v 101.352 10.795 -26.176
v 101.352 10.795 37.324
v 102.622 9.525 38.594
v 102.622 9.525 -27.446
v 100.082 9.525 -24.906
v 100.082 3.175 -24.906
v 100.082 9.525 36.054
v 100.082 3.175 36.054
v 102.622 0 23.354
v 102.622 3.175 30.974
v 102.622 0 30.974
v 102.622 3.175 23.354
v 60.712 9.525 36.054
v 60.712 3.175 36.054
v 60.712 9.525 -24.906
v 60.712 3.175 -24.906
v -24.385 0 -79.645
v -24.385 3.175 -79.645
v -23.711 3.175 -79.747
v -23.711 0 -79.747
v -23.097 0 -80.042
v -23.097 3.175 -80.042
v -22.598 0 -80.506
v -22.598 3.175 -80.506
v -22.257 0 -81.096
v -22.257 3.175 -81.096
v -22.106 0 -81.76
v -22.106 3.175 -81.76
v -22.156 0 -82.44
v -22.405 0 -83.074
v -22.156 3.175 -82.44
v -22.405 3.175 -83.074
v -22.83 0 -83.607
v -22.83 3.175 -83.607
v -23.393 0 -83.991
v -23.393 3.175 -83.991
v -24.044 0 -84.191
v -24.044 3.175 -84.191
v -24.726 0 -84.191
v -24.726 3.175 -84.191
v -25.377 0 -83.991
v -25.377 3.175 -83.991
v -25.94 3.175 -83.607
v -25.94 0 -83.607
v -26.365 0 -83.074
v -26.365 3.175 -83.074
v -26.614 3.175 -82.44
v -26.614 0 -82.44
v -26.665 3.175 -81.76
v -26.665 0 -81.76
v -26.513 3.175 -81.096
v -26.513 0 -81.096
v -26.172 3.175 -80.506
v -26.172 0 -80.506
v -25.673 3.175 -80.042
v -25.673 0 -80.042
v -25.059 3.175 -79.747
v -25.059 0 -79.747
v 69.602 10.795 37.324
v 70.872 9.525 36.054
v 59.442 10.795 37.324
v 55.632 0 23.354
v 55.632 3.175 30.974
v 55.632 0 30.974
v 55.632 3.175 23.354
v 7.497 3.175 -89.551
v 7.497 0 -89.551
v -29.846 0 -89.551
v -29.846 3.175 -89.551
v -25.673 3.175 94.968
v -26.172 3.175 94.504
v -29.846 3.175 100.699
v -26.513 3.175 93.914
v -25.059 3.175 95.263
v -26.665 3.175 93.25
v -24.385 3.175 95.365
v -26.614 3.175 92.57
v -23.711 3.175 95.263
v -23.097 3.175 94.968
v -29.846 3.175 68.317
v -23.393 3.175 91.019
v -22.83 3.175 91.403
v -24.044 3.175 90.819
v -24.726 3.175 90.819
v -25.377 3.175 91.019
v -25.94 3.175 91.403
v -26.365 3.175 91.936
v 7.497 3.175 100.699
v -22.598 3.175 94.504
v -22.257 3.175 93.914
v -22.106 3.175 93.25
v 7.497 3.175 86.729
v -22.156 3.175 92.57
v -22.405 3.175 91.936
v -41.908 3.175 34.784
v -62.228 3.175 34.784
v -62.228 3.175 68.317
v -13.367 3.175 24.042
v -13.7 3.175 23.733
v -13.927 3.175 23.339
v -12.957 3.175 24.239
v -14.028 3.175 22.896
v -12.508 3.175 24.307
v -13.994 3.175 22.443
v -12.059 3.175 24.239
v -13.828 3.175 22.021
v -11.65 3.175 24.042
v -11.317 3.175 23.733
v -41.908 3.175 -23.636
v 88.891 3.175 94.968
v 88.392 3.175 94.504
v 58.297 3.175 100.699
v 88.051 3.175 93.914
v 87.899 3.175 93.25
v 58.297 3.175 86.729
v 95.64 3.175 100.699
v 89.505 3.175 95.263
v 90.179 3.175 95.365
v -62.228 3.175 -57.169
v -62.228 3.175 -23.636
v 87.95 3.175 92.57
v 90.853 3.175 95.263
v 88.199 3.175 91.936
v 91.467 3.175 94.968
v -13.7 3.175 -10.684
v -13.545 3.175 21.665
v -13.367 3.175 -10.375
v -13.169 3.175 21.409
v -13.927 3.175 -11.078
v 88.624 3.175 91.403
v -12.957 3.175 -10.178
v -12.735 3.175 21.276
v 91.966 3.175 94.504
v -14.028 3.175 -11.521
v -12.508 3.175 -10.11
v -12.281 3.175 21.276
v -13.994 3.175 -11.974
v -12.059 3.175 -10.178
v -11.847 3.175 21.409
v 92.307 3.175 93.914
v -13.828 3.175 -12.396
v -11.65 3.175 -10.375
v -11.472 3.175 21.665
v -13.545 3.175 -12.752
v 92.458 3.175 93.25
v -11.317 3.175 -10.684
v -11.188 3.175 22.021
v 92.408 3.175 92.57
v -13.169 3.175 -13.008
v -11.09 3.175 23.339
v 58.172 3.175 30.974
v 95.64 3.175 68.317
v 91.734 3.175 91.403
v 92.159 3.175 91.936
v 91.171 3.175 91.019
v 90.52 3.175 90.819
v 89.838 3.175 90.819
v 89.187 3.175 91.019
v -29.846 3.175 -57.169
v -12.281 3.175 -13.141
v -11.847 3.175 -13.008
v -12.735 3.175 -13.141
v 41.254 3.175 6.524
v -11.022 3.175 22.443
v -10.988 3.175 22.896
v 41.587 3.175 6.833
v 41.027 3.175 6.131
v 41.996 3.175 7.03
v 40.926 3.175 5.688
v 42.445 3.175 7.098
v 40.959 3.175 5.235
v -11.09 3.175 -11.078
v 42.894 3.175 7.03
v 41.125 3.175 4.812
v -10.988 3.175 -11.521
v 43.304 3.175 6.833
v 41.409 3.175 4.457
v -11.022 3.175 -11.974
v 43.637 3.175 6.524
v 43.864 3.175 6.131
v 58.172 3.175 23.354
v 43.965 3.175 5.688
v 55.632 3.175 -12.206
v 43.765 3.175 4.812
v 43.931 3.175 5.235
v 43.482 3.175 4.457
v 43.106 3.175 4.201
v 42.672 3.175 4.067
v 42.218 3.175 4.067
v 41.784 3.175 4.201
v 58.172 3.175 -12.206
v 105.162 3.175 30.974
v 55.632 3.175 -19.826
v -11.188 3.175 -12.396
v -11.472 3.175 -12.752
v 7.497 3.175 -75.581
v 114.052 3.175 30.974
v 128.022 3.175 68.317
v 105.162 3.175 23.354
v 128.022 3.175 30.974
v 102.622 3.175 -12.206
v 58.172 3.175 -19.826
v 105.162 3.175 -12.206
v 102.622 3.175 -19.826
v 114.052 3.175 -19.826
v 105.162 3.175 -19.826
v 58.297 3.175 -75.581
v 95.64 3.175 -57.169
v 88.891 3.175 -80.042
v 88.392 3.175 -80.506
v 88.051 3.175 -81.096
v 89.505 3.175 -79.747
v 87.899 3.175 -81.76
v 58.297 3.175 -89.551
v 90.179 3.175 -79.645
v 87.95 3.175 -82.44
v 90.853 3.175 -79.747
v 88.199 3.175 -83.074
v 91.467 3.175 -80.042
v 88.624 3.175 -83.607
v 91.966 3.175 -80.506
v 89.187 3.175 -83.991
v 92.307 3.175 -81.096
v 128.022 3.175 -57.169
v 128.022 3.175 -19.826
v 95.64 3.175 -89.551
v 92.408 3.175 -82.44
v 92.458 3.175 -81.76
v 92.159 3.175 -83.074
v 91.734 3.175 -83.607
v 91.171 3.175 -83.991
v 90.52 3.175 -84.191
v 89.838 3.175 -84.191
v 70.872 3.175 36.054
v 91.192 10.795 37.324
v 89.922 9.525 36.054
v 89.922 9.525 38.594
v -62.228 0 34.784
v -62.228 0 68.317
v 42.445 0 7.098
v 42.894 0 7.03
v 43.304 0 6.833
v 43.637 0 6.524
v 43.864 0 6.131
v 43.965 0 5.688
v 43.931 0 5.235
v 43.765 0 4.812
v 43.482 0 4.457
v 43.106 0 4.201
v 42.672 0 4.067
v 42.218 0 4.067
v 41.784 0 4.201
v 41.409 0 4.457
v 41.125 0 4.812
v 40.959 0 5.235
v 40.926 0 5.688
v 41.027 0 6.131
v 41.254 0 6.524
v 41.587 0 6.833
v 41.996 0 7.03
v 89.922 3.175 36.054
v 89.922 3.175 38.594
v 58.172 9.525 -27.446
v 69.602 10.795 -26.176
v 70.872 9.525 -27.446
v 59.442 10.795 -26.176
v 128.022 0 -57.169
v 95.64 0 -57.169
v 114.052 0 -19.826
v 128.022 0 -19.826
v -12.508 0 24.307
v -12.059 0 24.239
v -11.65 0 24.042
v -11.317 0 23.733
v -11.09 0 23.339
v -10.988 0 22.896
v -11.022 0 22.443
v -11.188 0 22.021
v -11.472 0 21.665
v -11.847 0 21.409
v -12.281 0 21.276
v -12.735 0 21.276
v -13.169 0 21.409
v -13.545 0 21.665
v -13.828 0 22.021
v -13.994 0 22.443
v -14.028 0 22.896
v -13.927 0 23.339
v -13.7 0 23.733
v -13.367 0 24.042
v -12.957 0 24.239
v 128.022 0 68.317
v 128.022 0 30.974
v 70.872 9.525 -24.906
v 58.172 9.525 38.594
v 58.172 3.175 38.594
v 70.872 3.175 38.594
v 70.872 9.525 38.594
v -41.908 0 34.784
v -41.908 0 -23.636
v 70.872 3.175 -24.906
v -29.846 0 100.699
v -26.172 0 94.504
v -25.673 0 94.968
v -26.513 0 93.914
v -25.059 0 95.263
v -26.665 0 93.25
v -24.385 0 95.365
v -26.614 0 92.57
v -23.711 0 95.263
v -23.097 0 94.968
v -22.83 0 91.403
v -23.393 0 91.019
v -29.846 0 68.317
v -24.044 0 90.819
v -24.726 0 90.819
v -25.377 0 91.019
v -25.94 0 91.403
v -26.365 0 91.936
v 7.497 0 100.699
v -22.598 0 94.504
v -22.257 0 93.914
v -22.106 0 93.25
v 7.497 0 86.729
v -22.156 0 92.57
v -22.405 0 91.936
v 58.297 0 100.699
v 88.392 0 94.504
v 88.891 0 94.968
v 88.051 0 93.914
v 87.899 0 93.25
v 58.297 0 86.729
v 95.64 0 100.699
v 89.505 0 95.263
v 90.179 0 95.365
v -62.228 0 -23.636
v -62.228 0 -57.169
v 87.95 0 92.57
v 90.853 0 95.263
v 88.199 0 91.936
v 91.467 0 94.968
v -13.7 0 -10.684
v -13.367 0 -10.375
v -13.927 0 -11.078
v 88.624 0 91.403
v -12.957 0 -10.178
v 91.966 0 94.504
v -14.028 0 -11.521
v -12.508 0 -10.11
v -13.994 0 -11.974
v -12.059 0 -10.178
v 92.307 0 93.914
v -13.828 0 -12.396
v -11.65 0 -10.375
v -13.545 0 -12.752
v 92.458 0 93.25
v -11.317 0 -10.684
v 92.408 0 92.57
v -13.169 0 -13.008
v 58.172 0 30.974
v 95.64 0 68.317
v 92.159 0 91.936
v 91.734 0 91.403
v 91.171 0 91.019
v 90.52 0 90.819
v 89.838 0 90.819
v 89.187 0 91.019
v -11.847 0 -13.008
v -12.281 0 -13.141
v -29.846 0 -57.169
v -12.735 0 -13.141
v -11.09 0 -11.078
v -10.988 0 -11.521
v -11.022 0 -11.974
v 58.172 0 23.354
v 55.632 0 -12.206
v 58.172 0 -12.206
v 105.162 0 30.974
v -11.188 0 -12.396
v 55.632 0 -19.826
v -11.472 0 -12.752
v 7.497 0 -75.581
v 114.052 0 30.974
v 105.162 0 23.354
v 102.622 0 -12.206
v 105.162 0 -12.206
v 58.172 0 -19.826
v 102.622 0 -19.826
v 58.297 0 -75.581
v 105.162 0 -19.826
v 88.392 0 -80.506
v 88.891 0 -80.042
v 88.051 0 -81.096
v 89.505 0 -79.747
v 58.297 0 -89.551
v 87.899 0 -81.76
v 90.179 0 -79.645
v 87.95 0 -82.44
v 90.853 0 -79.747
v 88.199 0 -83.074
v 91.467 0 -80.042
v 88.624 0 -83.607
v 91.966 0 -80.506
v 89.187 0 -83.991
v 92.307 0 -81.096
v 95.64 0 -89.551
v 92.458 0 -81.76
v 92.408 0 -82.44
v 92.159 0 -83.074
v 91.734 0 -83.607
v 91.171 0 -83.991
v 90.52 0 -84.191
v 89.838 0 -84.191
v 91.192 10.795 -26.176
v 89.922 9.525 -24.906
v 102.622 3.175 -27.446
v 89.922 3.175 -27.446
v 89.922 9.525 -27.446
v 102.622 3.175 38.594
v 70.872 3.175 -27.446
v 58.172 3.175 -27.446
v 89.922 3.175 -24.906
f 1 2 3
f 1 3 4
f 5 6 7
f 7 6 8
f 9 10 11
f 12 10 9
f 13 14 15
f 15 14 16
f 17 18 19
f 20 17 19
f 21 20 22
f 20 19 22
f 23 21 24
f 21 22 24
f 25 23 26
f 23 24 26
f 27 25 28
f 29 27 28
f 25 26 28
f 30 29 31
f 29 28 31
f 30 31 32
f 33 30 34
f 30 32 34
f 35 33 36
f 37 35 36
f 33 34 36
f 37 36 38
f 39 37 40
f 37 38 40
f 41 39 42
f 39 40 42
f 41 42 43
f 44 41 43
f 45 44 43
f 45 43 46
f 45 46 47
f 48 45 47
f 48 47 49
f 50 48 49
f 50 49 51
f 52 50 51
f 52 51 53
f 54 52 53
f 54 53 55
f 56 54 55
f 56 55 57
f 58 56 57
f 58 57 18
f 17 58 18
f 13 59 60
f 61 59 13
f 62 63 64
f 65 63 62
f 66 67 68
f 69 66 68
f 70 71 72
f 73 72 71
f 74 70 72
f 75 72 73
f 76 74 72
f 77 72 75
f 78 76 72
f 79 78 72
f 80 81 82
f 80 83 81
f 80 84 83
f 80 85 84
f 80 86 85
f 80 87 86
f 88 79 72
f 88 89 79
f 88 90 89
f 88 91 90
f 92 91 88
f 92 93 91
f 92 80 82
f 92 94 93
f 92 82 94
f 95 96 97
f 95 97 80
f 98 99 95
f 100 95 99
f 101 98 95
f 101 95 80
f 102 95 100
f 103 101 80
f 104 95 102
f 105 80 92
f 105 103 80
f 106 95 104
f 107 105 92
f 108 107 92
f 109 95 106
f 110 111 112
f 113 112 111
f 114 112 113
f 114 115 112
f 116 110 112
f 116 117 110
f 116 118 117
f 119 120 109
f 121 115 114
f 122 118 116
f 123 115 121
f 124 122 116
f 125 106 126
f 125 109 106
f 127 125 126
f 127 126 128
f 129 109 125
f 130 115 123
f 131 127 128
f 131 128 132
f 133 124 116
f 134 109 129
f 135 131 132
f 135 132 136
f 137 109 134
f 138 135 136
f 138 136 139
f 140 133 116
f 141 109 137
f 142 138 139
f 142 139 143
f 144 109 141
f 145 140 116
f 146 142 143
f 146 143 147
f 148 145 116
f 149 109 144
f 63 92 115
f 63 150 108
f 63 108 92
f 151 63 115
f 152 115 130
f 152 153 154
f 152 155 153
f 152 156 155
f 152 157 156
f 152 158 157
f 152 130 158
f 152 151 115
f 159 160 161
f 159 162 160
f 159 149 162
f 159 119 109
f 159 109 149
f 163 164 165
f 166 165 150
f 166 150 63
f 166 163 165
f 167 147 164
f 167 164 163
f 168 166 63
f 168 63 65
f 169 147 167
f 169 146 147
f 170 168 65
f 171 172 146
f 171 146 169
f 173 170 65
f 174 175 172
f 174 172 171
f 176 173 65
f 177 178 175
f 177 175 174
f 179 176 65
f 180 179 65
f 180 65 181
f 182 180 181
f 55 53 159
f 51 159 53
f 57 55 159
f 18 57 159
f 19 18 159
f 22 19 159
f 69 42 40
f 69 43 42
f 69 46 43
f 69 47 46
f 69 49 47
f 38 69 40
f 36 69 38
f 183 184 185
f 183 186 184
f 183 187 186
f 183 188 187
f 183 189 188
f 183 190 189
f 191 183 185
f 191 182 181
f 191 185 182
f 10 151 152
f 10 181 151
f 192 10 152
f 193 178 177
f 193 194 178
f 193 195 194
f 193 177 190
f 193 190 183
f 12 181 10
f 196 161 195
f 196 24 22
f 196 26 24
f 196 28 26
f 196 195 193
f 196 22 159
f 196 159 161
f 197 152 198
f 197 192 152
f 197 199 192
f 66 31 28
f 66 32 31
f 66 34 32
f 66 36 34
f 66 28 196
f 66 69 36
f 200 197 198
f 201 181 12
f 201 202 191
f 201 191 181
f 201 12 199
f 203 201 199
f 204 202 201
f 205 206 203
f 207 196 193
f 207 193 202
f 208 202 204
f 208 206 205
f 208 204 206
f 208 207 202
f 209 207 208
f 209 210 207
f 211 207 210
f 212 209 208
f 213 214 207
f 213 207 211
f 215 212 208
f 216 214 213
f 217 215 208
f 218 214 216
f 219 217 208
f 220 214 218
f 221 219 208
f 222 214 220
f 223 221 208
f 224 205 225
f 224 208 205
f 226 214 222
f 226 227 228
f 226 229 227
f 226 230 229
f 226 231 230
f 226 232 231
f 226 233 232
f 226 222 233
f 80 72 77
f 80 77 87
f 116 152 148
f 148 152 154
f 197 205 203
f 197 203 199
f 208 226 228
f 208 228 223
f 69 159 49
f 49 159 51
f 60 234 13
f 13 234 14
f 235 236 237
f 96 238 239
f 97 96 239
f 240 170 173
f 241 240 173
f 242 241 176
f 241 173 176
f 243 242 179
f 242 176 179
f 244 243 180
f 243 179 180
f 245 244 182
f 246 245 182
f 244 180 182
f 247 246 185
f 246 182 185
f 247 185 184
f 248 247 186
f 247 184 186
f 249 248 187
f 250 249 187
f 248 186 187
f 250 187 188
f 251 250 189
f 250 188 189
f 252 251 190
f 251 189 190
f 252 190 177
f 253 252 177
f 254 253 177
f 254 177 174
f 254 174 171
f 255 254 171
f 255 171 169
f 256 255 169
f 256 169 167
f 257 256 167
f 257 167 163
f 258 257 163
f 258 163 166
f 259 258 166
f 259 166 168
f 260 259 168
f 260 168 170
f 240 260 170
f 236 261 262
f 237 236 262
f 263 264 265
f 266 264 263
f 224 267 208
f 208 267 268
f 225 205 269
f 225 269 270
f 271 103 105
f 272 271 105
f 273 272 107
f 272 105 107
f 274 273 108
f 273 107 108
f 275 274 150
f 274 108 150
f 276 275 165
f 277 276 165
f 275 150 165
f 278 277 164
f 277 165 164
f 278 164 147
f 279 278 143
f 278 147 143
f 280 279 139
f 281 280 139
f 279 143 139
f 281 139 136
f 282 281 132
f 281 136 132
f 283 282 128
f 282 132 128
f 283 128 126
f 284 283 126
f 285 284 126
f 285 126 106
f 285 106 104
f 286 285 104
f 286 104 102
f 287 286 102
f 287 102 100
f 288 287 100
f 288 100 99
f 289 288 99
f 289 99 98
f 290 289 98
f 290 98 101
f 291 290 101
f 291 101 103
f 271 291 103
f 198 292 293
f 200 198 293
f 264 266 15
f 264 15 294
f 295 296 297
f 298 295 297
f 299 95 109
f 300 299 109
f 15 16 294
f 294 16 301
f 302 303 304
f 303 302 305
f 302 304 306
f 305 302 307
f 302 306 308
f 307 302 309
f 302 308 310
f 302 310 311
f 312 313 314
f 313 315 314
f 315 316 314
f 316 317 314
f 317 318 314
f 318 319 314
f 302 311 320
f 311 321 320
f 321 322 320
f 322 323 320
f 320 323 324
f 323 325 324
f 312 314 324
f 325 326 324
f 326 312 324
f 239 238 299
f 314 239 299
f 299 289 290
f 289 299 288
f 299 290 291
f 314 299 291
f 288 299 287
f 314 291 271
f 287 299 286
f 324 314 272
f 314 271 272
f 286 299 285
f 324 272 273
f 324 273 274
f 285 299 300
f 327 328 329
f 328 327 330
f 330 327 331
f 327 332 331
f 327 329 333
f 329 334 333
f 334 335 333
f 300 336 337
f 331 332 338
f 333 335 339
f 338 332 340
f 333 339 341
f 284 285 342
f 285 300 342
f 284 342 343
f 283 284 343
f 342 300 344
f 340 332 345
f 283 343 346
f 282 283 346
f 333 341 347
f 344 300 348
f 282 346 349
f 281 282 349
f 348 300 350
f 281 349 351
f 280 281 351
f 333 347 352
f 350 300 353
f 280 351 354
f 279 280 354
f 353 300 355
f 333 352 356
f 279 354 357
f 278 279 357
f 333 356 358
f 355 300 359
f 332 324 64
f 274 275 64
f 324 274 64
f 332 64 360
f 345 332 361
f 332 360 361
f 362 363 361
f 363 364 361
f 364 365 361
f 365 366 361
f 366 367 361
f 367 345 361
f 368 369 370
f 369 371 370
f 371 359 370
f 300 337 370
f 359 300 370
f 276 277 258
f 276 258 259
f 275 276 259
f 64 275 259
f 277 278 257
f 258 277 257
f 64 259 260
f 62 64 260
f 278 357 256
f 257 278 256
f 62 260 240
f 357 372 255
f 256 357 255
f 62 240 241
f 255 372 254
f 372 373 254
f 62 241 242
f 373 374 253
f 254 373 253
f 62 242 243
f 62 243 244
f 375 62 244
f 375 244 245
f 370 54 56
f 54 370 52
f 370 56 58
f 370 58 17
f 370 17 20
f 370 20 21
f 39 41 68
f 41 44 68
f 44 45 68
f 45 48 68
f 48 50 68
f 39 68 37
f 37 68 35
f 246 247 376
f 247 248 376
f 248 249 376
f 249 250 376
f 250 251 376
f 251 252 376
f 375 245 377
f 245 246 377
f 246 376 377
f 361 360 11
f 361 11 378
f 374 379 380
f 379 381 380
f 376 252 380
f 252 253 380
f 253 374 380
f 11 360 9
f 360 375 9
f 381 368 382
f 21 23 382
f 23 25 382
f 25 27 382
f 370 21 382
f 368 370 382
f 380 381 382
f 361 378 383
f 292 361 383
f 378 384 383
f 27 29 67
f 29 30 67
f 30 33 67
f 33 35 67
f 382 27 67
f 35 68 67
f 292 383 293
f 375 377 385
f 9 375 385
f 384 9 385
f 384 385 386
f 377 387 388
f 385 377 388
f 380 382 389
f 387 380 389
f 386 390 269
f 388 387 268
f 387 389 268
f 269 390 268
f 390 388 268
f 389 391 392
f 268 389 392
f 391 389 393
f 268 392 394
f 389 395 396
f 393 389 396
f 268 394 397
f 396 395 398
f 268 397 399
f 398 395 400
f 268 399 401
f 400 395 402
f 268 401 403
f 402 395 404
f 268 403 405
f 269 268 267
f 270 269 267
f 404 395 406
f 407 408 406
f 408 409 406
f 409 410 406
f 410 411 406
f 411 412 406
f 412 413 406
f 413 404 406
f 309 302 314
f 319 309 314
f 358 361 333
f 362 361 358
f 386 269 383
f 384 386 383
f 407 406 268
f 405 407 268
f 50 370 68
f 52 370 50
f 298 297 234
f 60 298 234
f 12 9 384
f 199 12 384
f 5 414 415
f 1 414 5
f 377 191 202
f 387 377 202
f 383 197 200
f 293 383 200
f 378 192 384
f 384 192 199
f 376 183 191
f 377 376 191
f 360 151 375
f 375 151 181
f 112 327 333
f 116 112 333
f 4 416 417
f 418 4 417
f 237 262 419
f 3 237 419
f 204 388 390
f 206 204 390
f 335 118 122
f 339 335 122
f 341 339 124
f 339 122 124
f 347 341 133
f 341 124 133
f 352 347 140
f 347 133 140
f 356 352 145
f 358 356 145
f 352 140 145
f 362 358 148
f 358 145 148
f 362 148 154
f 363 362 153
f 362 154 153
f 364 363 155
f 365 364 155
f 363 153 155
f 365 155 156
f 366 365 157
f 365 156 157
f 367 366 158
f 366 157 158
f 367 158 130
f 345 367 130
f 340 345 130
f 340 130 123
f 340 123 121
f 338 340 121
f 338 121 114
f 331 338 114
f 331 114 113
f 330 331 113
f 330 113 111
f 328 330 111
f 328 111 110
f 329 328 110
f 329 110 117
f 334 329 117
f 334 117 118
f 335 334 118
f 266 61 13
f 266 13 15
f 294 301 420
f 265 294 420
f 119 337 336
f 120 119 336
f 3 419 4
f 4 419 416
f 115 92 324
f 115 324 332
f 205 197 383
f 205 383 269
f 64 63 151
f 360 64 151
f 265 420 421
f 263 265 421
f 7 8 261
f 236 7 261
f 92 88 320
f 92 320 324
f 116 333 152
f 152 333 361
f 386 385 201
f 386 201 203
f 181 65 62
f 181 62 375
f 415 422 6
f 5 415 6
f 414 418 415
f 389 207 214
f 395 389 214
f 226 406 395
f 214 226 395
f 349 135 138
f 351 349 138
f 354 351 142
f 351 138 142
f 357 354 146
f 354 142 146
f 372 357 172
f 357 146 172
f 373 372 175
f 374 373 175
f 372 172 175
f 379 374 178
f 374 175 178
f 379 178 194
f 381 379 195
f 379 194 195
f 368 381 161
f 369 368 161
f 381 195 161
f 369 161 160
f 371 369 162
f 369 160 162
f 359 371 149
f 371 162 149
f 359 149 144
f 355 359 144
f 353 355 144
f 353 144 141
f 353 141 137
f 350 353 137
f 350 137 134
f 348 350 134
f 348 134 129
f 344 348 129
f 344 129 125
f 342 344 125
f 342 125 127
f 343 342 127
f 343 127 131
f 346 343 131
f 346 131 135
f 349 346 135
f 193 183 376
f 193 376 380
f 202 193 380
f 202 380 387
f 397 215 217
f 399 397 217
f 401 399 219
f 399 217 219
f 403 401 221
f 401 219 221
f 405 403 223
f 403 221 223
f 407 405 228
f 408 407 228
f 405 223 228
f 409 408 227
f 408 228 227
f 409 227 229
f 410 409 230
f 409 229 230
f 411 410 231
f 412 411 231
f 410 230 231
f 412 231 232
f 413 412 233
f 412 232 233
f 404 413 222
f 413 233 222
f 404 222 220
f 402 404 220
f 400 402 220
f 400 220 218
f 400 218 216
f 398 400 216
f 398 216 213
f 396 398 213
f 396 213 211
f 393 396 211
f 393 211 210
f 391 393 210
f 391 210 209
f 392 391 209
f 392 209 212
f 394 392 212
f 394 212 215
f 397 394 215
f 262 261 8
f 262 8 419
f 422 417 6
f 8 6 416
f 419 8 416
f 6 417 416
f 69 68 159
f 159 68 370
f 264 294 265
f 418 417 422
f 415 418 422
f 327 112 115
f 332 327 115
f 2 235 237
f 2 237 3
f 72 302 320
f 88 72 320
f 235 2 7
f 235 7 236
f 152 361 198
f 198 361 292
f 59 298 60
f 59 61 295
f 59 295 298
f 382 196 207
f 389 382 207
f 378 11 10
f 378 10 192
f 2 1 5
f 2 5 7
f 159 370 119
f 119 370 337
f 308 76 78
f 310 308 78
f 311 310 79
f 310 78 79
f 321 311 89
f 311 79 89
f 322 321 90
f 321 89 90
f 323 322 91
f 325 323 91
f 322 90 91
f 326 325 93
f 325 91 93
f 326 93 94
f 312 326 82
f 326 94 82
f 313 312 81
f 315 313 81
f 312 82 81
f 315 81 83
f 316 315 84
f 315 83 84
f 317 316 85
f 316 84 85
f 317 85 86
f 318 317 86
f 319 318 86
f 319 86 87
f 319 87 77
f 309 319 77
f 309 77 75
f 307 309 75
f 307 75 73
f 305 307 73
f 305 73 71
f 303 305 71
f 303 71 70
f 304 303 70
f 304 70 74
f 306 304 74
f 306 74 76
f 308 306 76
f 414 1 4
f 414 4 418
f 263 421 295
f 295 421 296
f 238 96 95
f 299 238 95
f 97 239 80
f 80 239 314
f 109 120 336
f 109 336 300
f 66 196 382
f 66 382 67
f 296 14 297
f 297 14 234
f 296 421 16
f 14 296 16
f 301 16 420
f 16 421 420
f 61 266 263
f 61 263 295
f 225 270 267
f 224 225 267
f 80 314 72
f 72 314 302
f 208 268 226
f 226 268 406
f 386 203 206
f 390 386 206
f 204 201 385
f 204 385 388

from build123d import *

# Parameters (mm, degrees)
BOSS_EXTRUDE1_DEPTH   = 3.175
SKETCH2_R             = 2.286
CUT_EXTRUDE1_DEPTH    = 163.910922896
SKETCH3_W             = 20.32
SKETCH3_H             = 58.42
SKETCH3_W_2           = 50.8
SKETCH3_H_2           = 13.97
SKETCH3_W_3           = 13.97
SKETCH3_H_3           = 50.8
CUT_EXTRUDE2_DEPTH    = 163.910922896
BOSS_EXTRUDE2_DEPTH   = 7.62
BOSS_EXTRUDE2_2_DEPTH = 7.62
CHAMFER1_SIZE         = 1.27
CHAMFER2_SIZE         = 1.27
SKETCH5_W             = 2.54
SKETCH5_H             = 7.62
CUT_EXTRUDE3_DEPTH    = 164.058126366
SKETCH6_R             = 1.524
CUT_EXTRUDE4_DEPTH    = 8.89


with BuildPart() as part:
    # Sketch1 → Boss-Extrude1 (new body)
    with BuildSketch(Plane(origin=(0, 0, 0), x_dir=(1, 0, 0), z_dir=(0, 1, 0))):
        Polygon((-62.22816, -68.31704), (-29.84616, -68.31704), (-29.84616, -100.69904), (95.63984, -100.69904), (95.63984, -68.31704), (128.02184, -68.31704), (128.02184, 57.16896), (95.63984, 57.16896), (95.63984, 89.55096), (-29.84616, 89.55096), (-29.84616, 57.16896), (-62.22816, 57.16896), align=None)
    extrude(amount=BOSS_EXTRUDE1_DEPTH)

    # Sketch2 → Cut-Extrude1 (cut, through all)
    with BuildSketch(Plane(origin=(0, 3.175, 0), x_dir=(1, 0, 0), z_dir=(0, 1, 0))):
        with Locations(Location((-24.38516, 81.93096, 0), (0, 0, 270))):
            Circle(SKETCH2_R)
        with Locations(Location((90.17884, 81.93096, 0), (0, 0, 270))):
            Circle(SKETCH2_R)
        with Locations(Location((90.17884, -93.07904, 0), (0, 0, 270))):
            Circle(SKETCH2_R)
        with Locations(Location((-24.38516, -93.07904, 0), (0, 0, 270))):
            Circle(SKETCH2_R)
    extrude(amount=-CUT_EXTRUDE1_DEPTH, mode=Mode.SUBTRACT)

    # Sketch3 → Cut-Extrude2 (cut, through all)
    with BuildSketch(Plane(origin=(0, 3.175, 0), x_dir=(1, 0, 0), z_dir=(0, 1, 0))):
        with Locations((-52.06816, -5.57404)):
            Rectangle(SKETCH3_W, SKETCH3_H)
        with Locations((32.89684, 82.56596)):
            Rectangle(SKETCH3_W_2, SKETCH3_H_2)
        with Locations((121.03684, -5.57404)):
            Rectangle(SKETCH3_W_3, SKETCH3_H_3)
        with Locations((32.89684, -93.71404)):
            Rectangle(SKETCH3_W_2, SKETCH3_H_2)
    extrude(amount=-CUT_EXTRUDE2_DEPTH, mode=Mode.SUBTRACT)

    # Sketch5 → Cut-Extrude3 (cut, through all)
    with BuildSketch(Plane(origin=(0, 3.175, 0), x_dir=(1, 0, 0), z_dir=(0, 1, 0))):
        with Locations((56.90184, 16.01596)):
            Rectangle(SKETCH5_W, SKETCH5_H)
        with Locations((56.90184, -27.16404)):
            Rectangle(SKETCH5_W, SKETCH5_H)
        with Locations((103.89184, -27.16404)):
            Rectangle(SKETCH5_W, SKETCH5_H)
        with Locations((103.89184, 16.01596)):
            Rectangle(SKETCH5_W, SKETCH5_H)
    extrude(amount=-CUT_EXTRUDE3_DEPTH, mode=Mode.SUBTRACT)

    # Sketch6 → Cut-Extrude4 (cut)
    with BuildSketch(Plane(origin=(0, 3.175, 0), x_dir=(1, 0, 0), z_dir=(0, 1, 0))):
        with Locations(Location((42.44524, -5.57404, 0), (0, 0, 270))):
            Circle(SKETCH6_R)
        with Locations(Location((-12.50816, -22.78254, 0), (0, 0, 270))):
            Circle(SKETCH6_R)
        with Locations(Location((-12.50816, 11.63446, 0), (0, 0, 270))):
            Circle(SKETCH6_R)
    extrude(amount=-CUT_EXTRUDE4_DEPTH, mode=Mode.SUBTRACT)


with BuildPart() as body_2:
    # Sketch4 → Boss-Extrude2 (new body)
    with BuildSketch(Plane(origin=(0, 3.175, 0), x_dir=(1, 0, 0), z_dir=(0, 1, 0))):
        Polygon((60.71184, 24.90596), (70.87184, 24.90596), (70.87184, 27.44596), (58.17184, 27.44596), (58.17184, -38.59404), (70.87184, -38.59404), (70.87184, -36.05404), (60.71184, -36.05404), align=None)
    extrude(amount=BOSS_EXTRUDE2_DEPTH)

    # Chamfer1
    chamfer1_edges = [body_2.edges().sort_by_distance(p)[0] for p in [
        (70.87184, 10.795, -26.17596),
        (64.52184, 10.795, -27.44596),
        (58.17184, 10.795, 5.57404),
        (64.52184, 10.795, 38.59404),
        (70.87184, 10.795, 37.32404),
        (65.79184, 10.795, 36.05404),
        (60.71184, 10.795, 5.57404),
        (65.79184, 10.795, -24.90596),
    ]]
    chamfer(chamfer1_edges, length=CHAMFER1_SIZE - 0.0001)  # a hair under: the kernel refuses the full size


with BuildPart() as body_3:
    # Sketch4 → Boss-Extrude2 2 (new body)
    with BuildSketch(Plane(origin=(0, 3.175, 0), x_dir=(1, 0, 0), z_dir=(0, 1, 0))):
        Polygon((100.08184, 24.90596), (100.08184, -36.05404), (89.92184, -36.05404), (89.92184, -38.59404), (102.62184, -38.59404), (102.62184, 27.44596), (89.92184, 27.44596), (89.92184, 24.90596), align=None)
    extrude(amount=BOSS_EXTRUDE2_2_DEPTH)

    # Chamfer2
    chamfer2_edges = [body_3.edges().sort_by_distance(p)[0] for p in [
        (96.27184, 10.795, 38.59404),
        (102.62184, 10.795, 5.57404),
        (96.27184, 10.795, -27.44596),
        (89.92184, 10.795, -26.17596),
        (95.00184, 10.795, -24.90596),
        (100.08184, 10.795, 5.57404),
        (95.00184, 10.795, 36.05404),
        (89.92184, 10.795, 37.32404),
    ]]
    chamfer(chamfer2_edges, length=CHAMFER2_SIZE - 0.0001)  # a hair under: the kernel refuses the full size


solid = Compound([part.part, body_2.part, body_3.part])
